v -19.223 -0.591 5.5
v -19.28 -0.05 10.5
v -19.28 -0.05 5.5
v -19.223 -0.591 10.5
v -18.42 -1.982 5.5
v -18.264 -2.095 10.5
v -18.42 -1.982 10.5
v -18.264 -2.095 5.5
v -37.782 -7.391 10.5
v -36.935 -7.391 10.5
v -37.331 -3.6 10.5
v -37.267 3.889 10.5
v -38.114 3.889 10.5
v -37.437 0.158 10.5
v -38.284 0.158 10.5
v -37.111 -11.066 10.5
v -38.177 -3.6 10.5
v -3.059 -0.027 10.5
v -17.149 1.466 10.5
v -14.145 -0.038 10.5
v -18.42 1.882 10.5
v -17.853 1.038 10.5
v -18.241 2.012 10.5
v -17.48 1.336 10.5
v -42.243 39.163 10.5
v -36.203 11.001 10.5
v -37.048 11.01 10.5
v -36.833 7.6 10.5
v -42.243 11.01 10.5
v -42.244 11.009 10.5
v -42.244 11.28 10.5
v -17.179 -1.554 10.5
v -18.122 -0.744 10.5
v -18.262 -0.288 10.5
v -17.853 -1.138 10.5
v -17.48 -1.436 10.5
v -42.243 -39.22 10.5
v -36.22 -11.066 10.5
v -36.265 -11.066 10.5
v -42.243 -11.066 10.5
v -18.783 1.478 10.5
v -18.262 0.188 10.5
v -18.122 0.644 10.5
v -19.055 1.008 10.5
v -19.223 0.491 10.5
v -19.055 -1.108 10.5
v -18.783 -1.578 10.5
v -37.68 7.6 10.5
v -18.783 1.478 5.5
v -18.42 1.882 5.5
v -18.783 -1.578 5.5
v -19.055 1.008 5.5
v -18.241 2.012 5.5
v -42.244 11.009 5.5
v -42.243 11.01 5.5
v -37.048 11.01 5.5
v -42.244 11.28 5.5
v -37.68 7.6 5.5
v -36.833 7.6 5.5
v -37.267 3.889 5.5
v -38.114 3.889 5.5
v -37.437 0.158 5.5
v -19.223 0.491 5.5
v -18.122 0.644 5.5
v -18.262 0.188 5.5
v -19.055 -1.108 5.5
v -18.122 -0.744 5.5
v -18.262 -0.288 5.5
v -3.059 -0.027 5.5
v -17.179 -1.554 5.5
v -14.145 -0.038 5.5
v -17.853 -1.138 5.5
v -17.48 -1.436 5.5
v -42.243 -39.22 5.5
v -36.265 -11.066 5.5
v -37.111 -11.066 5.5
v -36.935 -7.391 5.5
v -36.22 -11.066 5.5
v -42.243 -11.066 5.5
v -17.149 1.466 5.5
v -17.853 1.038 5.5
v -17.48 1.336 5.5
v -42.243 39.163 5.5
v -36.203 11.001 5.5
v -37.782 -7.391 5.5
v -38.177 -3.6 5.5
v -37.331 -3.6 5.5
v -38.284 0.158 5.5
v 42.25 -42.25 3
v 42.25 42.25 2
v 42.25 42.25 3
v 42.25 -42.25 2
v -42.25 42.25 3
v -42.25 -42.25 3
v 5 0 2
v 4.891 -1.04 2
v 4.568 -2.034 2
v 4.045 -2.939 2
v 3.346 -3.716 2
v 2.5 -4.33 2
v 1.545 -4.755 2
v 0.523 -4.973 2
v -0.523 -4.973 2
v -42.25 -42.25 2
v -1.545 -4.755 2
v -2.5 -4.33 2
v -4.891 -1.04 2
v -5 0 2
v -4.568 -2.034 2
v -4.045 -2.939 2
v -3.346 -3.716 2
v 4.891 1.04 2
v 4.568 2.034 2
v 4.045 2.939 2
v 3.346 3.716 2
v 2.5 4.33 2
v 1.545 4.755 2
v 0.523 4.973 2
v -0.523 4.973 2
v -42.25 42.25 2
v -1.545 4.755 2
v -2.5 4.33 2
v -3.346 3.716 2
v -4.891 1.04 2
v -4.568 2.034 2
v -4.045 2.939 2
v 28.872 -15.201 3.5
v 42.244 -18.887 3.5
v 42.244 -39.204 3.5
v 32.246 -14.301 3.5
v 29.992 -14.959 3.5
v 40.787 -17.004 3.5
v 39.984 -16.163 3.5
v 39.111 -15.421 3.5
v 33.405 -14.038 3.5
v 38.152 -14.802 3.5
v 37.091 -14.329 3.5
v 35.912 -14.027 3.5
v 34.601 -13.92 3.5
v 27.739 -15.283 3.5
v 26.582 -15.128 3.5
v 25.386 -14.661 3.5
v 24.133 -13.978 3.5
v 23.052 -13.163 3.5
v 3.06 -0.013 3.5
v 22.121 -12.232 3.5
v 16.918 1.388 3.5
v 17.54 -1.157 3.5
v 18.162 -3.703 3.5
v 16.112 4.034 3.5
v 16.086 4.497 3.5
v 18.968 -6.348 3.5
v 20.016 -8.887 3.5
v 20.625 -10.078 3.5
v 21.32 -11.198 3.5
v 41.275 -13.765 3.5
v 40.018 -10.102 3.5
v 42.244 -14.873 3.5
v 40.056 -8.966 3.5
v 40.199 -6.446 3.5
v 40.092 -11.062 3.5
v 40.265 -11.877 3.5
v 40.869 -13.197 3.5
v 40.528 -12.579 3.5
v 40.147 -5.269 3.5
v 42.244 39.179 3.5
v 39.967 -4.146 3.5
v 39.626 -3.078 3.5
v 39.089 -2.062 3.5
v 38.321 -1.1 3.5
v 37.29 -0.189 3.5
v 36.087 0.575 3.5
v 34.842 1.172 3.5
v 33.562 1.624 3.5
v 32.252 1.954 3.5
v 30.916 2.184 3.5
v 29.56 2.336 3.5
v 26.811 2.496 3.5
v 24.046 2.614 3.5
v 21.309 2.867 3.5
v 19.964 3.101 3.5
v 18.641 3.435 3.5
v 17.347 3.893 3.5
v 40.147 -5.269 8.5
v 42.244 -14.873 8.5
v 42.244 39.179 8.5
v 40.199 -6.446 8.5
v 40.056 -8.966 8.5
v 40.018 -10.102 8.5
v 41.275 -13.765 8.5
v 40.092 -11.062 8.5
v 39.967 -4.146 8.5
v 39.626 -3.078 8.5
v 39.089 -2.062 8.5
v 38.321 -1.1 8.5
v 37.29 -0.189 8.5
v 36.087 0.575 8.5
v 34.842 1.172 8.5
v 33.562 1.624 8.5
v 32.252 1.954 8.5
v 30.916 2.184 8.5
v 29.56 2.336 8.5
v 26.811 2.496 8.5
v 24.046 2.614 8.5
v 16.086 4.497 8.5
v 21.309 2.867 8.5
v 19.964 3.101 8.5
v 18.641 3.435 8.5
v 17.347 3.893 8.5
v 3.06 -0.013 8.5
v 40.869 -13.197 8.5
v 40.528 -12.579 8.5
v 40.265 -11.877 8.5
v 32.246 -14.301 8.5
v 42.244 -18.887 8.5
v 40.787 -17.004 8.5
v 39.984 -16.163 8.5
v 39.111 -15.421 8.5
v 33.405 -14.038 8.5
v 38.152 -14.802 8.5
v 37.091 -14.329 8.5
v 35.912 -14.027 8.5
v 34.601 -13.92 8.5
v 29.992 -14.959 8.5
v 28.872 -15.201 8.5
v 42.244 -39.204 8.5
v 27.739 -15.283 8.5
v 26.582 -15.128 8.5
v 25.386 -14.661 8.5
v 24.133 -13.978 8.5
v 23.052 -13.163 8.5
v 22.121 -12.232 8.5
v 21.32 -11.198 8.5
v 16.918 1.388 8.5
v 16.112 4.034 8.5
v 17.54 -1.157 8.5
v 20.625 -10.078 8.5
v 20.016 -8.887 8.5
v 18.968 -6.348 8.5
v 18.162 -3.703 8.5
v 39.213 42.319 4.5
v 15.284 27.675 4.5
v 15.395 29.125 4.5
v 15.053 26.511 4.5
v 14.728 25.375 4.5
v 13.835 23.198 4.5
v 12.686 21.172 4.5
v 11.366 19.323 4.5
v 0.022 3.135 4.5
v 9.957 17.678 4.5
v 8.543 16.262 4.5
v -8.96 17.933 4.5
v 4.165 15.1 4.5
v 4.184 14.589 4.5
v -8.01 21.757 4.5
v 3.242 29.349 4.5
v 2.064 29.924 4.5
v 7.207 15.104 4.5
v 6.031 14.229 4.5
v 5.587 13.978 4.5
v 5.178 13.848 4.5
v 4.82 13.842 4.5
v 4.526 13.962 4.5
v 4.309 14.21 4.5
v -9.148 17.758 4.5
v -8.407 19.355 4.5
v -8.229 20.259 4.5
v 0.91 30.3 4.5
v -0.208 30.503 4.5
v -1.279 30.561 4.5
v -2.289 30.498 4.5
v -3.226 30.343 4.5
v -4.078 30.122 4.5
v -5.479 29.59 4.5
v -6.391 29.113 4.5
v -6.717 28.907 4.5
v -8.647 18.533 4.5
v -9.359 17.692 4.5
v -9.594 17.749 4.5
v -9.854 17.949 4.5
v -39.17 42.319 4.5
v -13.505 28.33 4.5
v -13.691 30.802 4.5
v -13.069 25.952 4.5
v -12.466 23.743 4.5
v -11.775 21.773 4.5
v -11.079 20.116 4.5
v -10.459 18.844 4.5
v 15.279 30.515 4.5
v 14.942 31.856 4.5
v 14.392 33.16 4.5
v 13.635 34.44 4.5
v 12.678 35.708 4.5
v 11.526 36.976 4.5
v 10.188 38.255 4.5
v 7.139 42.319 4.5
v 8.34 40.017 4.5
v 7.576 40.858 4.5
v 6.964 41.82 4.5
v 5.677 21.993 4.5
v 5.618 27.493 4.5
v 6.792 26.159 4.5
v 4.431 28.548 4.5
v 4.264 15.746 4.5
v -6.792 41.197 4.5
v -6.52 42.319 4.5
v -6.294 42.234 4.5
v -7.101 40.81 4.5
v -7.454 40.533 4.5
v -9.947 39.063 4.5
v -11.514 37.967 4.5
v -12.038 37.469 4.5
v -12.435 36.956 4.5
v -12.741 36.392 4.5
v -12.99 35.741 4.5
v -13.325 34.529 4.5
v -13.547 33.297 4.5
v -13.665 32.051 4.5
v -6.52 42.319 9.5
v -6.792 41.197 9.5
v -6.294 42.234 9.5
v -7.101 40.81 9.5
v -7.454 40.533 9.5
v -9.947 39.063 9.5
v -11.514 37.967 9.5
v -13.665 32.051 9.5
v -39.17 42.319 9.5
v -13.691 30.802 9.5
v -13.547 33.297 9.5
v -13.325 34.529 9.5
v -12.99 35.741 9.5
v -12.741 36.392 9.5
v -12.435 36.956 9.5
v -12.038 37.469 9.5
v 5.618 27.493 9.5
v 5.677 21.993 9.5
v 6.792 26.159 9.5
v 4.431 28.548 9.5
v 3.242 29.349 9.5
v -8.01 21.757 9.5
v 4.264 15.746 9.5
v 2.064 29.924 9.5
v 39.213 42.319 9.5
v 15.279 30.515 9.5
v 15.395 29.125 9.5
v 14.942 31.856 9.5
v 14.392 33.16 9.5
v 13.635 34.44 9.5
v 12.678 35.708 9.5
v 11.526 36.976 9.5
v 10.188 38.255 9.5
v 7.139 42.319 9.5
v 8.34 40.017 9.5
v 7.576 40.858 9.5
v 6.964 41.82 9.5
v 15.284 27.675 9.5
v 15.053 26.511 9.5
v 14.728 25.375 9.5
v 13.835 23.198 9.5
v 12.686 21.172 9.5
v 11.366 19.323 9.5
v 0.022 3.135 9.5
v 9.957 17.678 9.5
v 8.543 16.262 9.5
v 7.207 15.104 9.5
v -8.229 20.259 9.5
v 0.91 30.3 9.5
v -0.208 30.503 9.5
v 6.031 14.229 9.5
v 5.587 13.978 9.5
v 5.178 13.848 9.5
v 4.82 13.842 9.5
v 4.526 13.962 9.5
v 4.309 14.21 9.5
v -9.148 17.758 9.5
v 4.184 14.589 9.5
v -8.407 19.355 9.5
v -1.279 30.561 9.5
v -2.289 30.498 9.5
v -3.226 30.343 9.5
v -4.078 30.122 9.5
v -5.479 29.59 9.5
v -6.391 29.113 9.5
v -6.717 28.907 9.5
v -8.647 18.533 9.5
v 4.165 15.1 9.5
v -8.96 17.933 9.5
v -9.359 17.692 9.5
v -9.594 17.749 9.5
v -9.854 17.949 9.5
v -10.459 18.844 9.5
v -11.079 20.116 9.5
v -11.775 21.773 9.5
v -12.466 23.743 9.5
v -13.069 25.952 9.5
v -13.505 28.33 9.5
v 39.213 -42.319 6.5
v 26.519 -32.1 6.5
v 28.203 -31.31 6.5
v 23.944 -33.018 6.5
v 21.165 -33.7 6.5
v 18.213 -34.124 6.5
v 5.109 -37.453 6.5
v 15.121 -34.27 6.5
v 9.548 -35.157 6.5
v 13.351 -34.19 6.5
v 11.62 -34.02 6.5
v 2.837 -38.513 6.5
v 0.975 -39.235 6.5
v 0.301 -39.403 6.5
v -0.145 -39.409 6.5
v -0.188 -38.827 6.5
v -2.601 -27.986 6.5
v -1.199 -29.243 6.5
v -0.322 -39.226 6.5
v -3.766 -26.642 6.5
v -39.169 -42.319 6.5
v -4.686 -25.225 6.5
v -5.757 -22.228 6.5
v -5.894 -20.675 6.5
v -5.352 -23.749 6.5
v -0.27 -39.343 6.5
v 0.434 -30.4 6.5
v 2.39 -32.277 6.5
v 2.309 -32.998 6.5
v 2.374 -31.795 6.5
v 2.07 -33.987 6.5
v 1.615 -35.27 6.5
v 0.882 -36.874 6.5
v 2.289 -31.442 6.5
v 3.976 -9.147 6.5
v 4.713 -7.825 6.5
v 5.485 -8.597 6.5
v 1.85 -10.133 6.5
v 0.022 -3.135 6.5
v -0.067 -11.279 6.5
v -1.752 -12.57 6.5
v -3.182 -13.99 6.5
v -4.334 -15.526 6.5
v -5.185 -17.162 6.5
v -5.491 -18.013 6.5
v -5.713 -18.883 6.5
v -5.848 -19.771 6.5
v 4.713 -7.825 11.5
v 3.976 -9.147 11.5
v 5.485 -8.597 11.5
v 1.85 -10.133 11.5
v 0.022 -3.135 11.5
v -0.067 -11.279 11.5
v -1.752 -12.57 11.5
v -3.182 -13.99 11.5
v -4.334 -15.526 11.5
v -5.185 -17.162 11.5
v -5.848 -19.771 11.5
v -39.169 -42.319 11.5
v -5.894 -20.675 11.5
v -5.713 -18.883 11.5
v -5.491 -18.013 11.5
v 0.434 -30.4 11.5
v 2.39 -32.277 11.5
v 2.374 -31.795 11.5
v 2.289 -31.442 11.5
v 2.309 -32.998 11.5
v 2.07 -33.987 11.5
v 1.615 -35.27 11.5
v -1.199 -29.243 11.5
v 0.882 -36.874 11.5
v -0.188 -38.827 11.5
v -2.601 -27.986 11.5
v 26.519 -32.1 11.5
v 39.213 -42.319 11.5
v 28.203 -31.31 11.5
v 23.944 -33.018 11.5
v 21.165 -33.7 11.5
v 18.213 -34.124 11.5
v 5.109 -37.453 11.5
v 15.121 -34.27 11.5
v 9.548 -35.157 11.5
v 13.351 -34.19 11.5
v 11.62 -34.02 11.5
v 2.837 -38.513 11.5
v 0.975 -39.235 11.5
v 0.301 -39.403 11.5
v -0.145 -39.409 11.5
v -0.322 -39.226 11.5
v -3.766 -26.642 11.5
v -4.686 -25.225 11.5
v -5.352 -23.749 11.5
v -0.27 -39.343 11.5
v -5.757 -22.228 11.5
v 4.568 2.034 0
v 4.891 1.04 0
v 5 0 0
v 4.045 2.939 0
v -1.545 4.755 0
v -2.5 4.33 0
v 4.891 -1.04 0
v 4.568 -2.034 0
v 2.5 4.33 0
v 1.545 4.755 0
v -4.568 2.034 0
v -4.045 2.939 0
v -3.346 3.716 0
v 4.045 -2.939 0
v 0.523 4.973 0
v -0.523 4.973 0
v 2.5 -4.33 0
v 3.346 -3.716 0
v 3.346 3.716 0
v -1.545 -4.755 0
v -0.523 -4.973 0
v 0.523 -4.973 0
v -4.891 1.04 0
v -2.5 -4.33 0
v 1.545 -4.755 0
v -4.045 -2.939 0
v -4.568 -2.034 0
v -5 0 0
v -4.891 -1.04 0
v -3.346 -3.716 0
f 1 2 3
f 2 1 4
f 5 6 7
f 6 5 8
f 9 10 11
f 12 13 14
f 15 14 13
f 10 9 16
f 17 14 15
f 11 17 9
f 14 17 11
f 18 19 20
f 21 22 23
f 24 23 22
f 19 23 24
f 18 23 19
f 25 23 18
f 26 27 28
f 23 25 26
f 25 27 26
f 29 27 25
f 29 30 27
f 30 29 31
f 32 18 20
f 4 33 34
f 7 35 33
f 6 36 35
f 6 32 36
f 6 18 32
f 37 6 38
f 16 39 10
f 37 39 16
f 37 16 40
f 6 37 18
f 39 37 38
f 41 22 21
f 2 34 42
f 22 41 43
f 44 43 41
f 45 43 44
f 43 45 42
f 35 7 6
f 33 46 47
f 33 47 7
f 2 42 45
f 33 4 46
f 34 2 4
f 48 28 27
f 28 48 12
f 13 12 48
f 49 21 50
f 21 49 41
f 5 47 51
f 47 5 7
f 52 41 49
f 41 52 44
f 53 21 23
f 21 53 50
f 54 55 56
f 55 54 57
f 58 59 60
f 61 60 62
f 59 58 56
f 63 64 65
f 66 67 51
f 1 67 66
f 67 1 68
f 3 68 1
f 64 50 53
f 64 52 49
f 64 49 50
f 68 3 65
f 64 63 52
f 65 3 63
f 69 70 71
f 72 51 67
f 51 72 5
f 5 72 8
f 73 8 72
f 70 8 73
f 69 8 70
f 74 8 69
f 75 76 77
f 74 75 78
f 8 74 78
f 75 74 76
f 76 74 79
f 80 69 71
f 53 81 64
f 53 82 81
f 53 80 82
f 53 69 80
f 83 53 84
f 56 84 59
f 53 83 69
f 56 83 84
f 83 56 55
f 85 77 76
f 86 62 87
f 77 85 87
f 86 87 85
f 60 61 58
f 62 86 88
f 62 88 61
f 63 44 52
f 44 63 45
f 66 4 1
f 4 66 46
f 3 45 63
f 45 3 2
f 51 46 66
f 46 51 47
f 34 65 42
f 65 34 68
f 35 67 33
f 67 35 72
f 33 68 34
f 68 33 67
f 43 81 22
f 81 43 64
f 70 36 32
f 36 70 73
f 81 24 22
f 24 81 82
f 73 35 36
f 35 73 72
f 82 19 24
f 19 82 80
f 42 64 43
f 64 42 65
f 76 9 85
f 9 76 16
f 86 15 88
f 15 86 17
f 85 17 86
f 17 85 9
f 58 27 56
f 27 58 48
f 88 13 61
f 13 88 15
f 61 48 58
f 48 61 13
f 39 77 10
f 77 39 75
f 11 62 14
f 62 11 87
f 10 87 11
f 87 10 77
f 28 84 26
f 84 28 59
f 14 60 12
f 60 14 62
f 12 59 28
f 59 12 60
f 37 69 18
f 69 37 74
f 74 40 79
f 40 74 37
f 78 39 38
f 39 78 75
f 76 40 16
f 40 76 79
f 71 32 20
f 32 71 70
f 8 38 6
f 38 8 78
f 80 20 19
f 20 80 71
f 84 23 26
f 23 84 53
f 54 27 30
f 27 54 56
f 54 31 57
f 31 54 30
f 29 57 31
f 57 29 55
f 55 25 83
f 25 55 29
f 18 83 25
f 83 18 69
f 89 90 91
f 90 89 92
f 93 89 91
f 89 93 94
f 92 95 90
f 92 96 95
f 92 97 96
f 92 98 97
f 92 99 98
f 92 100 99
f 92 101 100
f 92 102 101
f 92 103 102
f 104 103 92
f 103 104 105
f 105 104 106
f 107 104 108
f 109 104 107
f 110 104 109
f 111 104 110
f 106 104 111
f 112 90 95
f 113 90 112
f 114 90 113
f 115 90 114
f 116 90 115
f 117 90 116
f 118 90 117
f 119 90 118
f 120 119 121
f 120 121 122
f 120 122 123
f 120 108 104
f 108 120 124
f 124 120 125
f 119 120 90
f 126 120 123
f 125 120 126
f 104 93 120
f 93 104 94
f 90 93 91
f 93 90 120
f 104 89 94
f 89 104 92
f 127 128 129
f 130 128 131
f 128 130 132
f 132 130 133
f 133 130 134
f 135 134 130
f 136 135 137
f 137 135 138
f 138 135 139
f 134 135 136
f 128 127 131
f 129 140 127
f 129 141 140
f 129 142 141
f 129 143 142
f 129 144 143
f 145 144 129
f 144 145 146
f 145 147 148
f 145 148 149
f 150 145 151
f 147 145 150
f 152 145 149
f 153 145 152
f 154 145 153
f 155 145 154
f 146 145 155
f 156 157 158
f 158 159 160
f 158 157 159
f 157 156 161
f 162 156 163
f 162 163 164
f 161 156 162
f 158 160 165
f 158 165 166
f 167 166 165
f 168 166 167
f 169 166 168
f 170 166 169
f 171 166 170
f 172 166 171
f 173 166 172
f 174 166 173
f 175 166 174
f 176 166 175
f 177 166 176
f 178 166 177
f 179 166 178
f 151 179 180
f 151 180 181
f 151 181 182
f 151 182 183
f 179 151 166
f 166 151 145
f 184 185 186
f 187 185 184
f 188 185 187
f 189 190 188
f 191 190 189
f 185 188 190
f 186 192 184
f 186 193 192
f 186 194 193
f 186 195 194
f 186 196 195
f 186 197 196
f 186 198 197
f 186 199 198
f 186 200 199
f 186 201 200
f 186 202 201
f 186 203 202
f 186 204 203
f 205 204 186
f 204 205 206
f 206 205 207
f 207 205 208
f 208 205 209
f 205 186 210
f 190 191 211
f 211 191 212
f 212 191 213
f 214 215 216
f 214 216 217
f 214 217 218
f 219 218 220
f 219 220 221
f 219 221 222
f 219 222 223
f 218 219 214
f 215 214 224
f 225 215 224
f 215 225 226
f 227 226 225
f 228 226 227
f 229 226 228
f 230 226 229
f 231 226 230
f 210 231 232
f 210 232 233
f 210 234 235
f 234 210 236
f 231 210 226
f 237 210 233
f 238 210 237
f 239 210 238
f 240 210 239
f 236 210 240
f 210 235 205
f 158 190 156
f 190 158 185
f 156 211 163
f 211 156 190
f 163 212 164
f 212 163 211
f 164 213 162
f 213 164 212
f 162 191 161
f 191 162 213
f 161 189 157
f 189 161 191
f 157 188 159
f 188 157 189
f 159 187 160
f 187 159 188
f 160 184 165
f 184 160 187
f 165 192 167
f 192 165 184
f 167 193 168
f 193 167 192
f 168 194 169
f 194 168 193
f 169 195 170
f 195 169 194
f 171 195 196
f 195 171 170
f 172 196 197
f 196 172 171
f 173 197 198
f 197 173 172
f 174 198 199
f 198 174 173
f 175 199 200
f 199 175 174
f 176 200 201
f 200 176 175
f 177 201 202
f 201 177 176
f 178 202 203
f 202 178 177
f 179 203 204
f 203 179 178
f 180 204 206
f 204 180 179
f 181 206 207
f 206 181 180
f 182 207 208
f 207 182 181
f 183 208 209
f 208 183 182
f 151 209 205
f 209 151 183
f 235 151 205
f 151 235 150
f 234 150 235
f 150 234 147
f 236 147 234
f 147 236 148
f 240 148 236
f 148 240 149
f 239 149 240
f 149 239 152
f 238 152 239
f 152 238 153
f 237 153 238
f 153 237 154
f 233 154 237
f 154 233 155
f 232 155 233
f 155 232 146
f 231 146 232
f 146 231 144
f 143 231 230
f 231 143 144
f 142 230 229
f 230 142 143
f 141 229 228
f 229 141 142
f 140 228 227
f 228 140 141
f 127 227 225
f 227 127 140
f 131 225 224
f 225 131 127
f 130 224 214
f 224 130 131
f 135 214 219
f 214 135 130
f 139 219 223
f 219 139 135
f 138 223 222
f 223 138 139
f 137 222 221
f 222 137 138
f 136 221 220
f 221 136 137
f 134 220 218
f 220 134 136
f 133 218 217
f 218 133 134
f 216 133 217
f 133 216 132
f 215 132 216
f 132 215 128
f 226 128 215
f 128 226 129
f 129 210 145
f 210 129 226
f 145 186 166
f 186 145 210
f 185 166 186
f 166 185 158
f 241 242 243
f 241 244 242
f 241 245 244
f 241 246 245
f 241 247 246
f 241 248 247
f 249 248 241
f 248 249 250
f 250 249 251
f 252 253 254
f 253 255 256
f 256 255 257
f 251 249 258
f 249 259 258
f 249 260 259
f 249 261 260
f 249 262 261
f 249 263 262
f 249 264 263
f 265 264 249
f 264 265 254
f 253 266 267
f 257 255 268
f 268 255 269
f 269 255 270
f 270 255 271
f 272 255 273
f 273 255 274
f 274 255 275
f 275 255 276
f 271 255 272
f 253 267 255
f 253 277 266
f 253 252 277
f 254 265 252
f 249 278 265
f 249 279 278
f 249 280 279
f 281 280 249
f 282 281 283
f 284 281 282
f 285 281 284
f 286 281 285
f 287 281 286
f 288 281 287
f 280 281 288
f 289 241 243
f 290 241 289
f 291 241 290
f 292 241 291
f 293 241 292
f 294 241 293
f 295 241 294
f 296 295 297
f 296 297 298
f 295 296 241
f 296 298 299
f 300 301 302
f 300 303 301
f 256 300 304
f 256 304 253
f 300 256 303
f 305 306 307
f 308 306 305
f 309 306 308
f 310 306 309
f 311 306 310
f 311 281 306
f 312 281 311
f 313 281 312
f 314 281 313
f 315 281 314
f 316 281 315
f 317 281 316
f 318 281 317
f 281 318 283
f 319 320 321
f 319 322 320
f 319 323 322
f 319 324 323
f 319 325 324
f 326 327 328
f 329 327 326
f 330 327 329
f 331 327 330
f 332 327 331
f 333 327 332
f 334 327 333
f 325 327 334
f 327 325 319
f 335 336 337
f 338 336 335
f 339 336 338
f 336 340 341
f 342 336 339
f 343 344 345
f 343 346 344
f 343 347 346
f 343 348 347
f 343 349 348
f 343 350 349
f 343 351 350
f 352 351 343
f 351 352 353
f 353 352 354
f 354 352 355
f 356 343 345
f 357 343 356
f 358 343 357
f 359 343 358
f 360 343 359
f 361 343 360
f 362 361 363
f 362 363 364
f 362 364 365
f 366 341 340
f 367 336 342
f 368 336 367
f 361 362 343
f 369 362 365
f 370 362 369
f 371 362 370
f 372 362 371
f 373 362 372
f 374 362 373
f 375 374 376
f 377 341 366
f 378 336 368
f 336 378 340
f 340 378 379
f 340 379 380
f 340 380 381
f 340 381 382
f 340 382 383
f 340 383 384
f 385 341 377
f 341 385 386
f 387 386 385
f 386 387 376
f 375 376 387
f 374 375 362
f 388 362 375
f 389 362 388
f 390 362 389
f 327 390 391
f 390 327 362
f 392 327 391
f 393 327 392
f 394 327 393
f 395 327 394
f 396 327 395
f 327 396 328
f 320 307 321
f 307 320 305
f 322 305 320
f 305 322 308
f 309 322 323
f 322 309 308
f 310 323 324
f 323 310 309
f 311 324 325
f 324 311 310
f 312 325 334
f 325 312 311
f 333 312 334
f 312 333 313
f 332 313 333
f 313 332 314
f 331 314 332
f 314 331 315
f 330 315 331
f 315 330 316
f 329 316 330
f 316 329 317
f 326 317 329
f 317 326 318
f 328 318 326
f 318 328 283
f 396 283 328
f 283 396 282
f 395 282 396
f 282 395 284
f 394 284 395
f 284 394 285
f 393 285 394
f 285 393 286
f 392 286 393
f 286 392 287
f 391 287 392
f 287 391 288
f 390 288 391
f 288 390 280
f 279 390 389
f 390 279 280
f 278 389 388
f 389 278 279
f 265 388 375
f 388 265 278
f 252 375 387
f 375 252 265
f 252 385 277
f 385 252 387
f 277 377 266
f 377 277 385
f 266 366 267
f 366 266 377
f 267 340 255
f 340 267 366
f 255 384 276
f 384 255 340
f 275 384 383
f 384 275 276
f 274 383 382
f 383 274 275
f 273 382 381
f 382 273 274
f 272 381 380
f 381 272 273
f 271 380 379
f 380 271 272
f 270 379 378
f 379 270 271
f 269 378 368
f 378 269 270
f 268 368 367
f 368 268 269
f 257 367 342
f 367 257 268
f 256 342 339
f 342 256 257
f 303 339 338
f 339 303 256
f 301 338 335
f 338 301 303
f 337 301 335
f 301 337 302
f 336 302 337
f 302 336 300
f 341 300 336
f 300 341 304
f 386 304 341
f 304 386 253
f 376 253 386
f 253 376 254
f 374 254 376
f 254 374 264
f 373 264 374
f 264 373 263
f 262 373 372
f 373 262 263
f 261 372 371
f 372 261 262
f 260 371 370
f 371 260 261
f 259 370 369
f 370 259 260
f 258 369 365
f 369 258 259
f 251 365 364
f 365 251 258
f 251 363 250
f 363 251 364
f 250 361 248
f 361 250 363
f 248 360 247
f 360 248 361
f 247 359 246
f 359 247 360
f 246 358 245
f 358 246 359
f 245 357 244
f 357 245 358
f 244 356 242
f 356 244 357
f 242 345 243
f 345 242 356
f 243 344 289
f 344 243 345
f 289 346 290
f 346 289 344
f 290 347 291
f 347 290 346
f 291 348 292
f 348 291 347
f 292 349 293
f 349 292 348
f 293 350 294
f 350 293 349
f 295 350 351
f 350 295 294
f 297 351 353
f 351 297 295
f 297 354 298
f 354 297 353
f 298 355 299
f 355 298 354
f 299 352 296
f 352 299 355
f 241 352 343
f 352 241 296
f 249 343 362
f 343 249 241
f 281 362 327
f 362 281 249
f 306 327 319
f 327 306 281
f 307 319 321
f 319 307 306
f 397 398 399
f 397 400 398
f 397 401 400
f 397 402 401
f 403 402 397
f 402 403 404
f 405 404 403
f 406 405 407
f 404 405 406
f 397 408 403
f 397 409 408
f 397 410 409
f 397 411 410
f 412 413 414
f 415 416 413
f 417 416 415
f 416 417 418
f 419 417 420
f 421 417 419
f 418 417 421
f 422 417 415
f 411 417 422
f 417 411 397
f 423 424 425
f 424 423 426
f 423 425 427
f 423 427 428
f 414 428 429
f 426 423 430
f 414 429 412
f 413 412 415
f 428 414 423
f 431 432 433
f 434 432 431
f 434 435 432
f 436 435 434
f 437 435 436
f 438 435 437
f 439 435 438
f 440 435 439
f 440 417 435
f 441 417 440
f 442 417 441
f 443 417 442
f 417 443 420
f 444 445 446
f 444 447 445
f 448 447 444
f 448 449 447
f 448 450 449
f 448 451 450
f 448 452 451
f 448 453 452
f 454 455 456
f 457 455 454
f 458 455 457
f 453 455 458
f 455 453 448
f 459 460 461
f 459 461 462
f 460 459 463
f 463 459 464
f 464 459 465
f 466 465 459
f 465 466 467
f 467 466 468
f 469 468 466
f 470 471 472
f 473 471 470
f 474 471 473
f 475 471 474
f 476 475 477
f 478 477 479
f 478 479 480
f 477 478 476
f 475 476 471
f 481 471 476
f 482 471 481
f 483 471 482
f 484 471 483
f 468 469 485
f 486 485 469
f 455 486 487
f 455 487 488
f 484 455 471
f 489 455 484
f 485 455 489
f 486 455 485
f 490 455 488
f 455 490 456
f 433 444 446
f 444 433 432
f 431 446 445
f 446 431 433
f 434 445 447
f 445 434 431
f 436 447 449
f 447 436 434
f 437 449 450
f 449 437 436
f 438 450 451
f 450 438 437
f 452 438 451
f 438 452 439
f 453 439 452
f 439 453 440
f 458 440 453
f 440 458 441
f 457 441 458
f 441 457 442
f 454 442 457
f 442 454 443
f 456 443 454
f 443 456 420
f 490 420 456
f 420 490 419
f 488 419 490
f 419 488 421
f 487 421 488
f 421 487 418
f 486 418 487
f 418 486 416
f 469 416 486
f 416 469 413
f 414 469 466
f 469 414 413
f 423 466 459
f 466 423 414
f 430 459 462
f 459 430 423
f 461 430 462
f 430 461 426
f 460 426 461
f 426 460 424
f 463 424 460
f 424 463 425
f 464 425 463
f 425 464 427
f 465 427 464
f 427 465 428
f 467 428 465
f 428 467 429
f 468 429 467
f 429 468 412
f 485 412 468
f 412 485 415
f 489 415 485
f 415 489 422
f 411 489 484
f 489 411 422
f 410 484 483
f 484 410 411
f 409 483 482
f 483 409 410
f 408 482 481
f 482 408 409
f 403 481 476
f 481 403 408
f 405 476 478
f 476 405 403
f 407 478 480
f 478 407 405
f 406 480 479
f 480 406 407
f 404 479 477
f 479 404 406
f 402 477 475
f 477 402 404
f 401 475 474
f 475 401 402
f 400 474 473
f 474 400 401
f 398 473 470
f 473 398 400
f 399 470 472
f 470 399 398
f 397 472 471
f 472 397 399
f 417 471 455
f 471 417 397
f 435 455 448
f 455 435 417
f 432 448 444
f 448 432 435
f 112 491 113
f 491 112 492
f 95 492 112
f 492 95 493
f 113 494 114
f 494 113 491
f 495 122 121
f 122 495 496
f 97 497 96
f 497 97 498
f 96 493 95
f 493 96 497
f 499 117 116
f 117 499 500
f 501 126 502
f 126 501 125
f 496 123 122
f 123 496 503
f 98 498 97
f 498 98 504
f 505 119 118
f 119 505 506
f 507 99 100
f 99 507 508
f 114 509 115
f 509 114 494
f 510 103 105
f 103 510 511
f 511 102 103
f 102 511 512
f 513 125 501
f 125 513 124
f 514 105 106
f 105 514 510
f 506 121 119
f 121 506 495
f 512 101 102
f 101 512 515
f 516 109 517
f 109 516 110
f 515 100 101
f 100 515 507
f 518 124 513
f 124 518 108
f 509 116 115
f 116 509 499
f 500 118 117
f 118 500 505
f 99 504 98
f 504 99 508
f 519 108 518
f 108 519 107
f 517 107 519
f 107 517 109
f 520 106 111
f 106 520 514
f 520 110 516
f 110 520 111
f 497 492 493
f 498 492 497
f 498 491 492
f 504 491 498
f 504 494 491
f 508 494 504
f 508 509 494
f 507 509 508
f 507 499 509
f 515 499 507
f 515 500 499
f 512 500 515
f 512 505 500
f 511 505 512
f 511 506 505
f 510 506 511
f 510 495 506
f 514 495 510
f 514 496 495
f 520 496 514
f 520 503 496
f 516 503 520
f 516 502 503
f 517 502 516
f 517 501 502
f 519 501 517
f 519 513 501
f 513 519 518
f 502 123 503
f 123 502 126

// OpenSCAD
// Module names are of the form poly_<inkscape-path-id>().  As a result,
// you can associate a polygon in this OpenSCAD program with the corresponding
// SVG element in the Inkscape document by looking for the XML element with
// the attribute id="inkscape-path-id".

// fudge value is used to ensure that subtracted solids are a tad taller
// in the z dimension than the polygon being subtracted from.  This helps
// keep the resulting .stl file manifold.
fudge = 0.1;
height = 5;

module poly_sustainability(h)
{
  scale([25.4/90, -25.4/90, 1]) union()
  {
    linear_extrude(height=h)
      polygon([[119.059500,49.321938],[114.820081,49.739379],[110.714930,50.672563],[102.729188,53.003813],[98.759476,53.860707],[94.745789,54.151000],[90.643567,53.604105],[86.408250,51.949438],[81.966543,49.529252],[78.135691,46.642016],[74.838658,43.340990],[71.998406,39.679438],[69.537901,35.710619],[67.380105,31.487797],[63.664500,22.493188],[60.810105,13.119672],[58.605281,4.101000],[56.400691,-4.918141],[53.547000,-14.293062],[53.454500,-15.934312],[57.922292,-13.795368],[62.508553,-12.172638],[67.194408,-10.986966],[71.960984,-10.159195],[81.660799,-9.260733],[91.457000,-8.844000],[101.198592,-8.275743],[106.001723,-7.736902],[110.734578,-6.922711],[115.378283,-5.754013],[119.913963,-4.151651],[124.322743,-2.036470],[128.585750,0.670688],[132.240567,3.896293],[134.959598,7.307172],[136.863619,10.905199],[138.073406,14.692250],[138.709737,18.670199],[138.893387,22.840922],[138.385750,31.768188],[138.252571,35.795016],[138.513758,39.196957],[139.129612,42.084943],[140.060437,44.569906],[141.266536,46.762780],[142.708211,48.774496],[146.139500,52.698188],[146.139500,-138.824312],[7.299500,0.045688],[146.139500,138.911938],[146.139500,66.921938],[140.978191,60.251137],[138.133609,57.271657],[135.039344,54.642406],[131.640098,52.448097],[127.880574,50.773441],[123.705474,49.703151]]);
  }
}

module poly_make(h)
{
  scale([25.4/90, -25.4/90, 1]) union()
  {
    linear_extrude(height=h)
      polygon([[25.294875,-146.406813],[138.944875,-146.406813],[0.078625,-7.564312],[-138.790125,-146.406813],[-23.101375,-146.406813],[-22.301375,-146.104312],[-24.065906,-142.430094],[-25.161512,-141.058512],[-26.412625,-140.076813],[-35.245926,-134.869059],[-40.798094,-130.985406],[-42.653897,-129.220306],[-44.061590,-127.402457],[-45.145230,-125.403934],[-46.028875,-123.096813],[-47.214939,-118.805053],[-48.000101,-114.436529],[-48.420362,-110.023401],[-48.511727,-105.597828],[-47.851771,-96.837994],[-46.308250,-88.414313],[-44.169183,-80.584068],[-41.722586,-73.604547],[-39.256478,-67.733033],[-37.058875,-63.226813],[-34.916651,-60.055699],[-33.993017,-59.347848],[-33.160691,-59.143141],[-32.414419,-59.380084],[-31.748941,-59.997184],[-30.639344,-62.125875],[-29.789844,-65.037262],[-29.158387,-68.239391],[-28.381375,-73.548063],[-23.801375,-98.883062],[-22.646038,-99.613863],[-19.412820,-101.301734],[-14.450911,-103.189879],[-11.430819,-103.972555],[-8.109500,-104.521500],[-4.530603,-104.742115],[-0.737776,-104.539801],[3.225331,-103.819957],[7.315070,-102.487984],[11.487793,-100.449283],[15.699851,-97.609254],[19.907594,-93.873297],[24.067375,-89.146813],[20.115500,-74.382906],[15.109875,-52.249313],[14.757270,-49.960501],[14.826613,-48.149449],[15.269111,-46.808290],[16.035969,-45.929156],[17.078393,-45.504183],[18.347590,-45.525504],[19.794765,-45.985252],[21.371125,-46.875563],[25.535231,-49.975470],[30.270070,-54.079586],[35.280827,-59.093722],[40.272687,-64.923688],[44.950837,-71.475294],[49.020461,-78.654352],[52.186745,-86.366671],[53.339005,-90.393370],[54.154875,-94.518062],[54.548017,-99.656607],[54.137121,-104.580172],[52.945610,-109.331588],[50.996906,-113.953688],[48.314433,-118.489303],[44.921613,-122.981266],[40.841870,-127.472408],[36.098625,-132.005563],[29.552375,-138.249469],[26.843039,-141.229684],[24.674875,-144.636812],[25.294875,-146.406813]]);
  }
}

module poly_creatitvity(h)
{
  union() {
    scale([25.4/90, -25.4/90, 1])
    {
      linear_extrude(height=h)
        polygon([[-146.139500,-39.966937],[-146.139500,-39.009437],[-124.800750,-39.011937],[-46.575750,0.133063],[-124.795750,39.211813],[-143.664500,39.211813],[-146.138250,39.211813],[-146.138250,138.968063],[-7.297000,0.096813],[-146.138250,-138.768187],[-146.138250,-39.011937]]);
    }

    difference() {
      translate([-15.68, -0.05, 0])
      cylinder(h=h, r=2.6, $fs=0.5);

      translate([-15.68, -0.05, -h/2])
      scale([1,1,2])
      cylinder(h=h, r=1.6, $fs=0.5);

      translate([-13.68, -0.05, -h/2])
      scale([1,1,2])
      cylinder(h=h, r=1.6, $fs=0.5);
    }
    poly_border(h);
  }
}

module poly_border(h)
{
  translate([0.3, 0, 0])
  scale([25.4/90, -25.4/90, 1])
  {
    difference() {
      scale([1, 1.2, 1])
      bow(h);

      translate([ 3, 0, -h/2])
      scale([1,1.2,2])
      bow(h);
    }
  }
}

module bow(h) {
  linear_extrude(height=h)
    polygon([[-125.332625,-44.244312],[-128.603252,-33.355375],[-131.030145,-22.440934],[-132.567847,-11.483456],[-133.170906,-0.465406],[-132.793868,10.630749],[-131.391277,21.822543],[-128.917681,33.127511],[-125.327625,44.563188]]);
}

module poly_tip(h)
{
  scale([25.4/90, -25.4/90, 1]) union()
  {
    linear_extrude(height=h)
      polygon([[-46.478250,0.159938],[-46.663282,1.994305],[-47.193973,3.703238],[-48.033716,5.250013],[-49.145906,6.597906],[-50.493936,7.710194],[-52.041199,8.550152],[-53.751089,9.081058],[-55.587000,9.266188],[-57.422444,9.081058],[-59.131883,8.550152],[-60.678724,7.710194],[-62.026375,6.597906],[-63.138245,5.250013],[-63.977742,3.703238],[-64.508274,1.994305],[-64.693250,0.159938],[-64.508274,-1.676081],[-63.977742,-3.386254],[-63.138245,-4.933917],[-62.026375,-6.282406],[-60.678724,-7.395055],[-59.131883,-8.235199],[-57.422444,-8.766173],[-55.587000,-8.951313],[-53.751089,-8.766173],[-52.041199,-8.235199],[-50.493936,-7.395055],[-49.145906,-6.282406],[-48.033716,-4.933917],[-47.193973,-3.386254],[-46.663282,-1.676081],[-46.478250,0.159938]]);
  }
}

module poly_social(h)
{
  scale([25.4/90, -25.4/90, 1]) union()
  {
    linear_extrude(height=h)
      polygon([[99.931125,107.398063],[93.964875,110.195563],[84.841145,113.449215],[74.992844,115.865094],[64.533996,117.369020],[53.578625,117.886813],[47.306281,117.601188],[41.173625,117.000563],[33.830168,121.030191],[18.104406,129.165719],[10.053447,132.920057],[3.453254,135.477105],[1.066606,136.075004],[-0.514058,136.095609],[-0.955969,135.860471],[-1.140973,135.446264],[-0.666375,134.034313],[3.124208,127.112831],[5.720871,121.427457],[7.335825,116.881644],[8.181281,113.378844],[8.469453,110.822508],[8.412551,109.116090],[8.112375,107.866813],[1.538410,104.172823],[-4.247234,100.074039],[-9.217371,95.619298],[-13.344812,90.857438],[-16.602371,85.837296],[-18.962859,80.607711],[-20.399090,75.217521],[-20.883875,69.715563],[-20.722091,66.512633],[-20.243042,63.365719],[-19.456886,60.281383],[-18.373777,57.266188],[-15.357334,51.469469],[-11.274969,46.028063],[-6.207935,40.994469],[-0.237488,36.421188],[6.555117,32.360719],[14.088625,28.865563],[19.436125,26.919313],[16.698625,24.183063],[0.078625,7.564313],[-138.788875,146.406813],[138.944875,146.406813],[99.931125,107.398063]]);
  }
}

union() {
  translate([0,0,height/2]) cube([84.5,84.5,1], center=true);

  translate([1, 0, height/2 + 1])
  poly_sustainability(height);

  translate([0, 1, height/2 +2 ])
  poly_make(height);

  translate([-1, 0, height/2 +3])
  poly_creatitvity(height);

  translate([0, -1, height/2 +4])
  poly_social(height);

  cylinder(h=height/2, r=5, $fs=1);
}
